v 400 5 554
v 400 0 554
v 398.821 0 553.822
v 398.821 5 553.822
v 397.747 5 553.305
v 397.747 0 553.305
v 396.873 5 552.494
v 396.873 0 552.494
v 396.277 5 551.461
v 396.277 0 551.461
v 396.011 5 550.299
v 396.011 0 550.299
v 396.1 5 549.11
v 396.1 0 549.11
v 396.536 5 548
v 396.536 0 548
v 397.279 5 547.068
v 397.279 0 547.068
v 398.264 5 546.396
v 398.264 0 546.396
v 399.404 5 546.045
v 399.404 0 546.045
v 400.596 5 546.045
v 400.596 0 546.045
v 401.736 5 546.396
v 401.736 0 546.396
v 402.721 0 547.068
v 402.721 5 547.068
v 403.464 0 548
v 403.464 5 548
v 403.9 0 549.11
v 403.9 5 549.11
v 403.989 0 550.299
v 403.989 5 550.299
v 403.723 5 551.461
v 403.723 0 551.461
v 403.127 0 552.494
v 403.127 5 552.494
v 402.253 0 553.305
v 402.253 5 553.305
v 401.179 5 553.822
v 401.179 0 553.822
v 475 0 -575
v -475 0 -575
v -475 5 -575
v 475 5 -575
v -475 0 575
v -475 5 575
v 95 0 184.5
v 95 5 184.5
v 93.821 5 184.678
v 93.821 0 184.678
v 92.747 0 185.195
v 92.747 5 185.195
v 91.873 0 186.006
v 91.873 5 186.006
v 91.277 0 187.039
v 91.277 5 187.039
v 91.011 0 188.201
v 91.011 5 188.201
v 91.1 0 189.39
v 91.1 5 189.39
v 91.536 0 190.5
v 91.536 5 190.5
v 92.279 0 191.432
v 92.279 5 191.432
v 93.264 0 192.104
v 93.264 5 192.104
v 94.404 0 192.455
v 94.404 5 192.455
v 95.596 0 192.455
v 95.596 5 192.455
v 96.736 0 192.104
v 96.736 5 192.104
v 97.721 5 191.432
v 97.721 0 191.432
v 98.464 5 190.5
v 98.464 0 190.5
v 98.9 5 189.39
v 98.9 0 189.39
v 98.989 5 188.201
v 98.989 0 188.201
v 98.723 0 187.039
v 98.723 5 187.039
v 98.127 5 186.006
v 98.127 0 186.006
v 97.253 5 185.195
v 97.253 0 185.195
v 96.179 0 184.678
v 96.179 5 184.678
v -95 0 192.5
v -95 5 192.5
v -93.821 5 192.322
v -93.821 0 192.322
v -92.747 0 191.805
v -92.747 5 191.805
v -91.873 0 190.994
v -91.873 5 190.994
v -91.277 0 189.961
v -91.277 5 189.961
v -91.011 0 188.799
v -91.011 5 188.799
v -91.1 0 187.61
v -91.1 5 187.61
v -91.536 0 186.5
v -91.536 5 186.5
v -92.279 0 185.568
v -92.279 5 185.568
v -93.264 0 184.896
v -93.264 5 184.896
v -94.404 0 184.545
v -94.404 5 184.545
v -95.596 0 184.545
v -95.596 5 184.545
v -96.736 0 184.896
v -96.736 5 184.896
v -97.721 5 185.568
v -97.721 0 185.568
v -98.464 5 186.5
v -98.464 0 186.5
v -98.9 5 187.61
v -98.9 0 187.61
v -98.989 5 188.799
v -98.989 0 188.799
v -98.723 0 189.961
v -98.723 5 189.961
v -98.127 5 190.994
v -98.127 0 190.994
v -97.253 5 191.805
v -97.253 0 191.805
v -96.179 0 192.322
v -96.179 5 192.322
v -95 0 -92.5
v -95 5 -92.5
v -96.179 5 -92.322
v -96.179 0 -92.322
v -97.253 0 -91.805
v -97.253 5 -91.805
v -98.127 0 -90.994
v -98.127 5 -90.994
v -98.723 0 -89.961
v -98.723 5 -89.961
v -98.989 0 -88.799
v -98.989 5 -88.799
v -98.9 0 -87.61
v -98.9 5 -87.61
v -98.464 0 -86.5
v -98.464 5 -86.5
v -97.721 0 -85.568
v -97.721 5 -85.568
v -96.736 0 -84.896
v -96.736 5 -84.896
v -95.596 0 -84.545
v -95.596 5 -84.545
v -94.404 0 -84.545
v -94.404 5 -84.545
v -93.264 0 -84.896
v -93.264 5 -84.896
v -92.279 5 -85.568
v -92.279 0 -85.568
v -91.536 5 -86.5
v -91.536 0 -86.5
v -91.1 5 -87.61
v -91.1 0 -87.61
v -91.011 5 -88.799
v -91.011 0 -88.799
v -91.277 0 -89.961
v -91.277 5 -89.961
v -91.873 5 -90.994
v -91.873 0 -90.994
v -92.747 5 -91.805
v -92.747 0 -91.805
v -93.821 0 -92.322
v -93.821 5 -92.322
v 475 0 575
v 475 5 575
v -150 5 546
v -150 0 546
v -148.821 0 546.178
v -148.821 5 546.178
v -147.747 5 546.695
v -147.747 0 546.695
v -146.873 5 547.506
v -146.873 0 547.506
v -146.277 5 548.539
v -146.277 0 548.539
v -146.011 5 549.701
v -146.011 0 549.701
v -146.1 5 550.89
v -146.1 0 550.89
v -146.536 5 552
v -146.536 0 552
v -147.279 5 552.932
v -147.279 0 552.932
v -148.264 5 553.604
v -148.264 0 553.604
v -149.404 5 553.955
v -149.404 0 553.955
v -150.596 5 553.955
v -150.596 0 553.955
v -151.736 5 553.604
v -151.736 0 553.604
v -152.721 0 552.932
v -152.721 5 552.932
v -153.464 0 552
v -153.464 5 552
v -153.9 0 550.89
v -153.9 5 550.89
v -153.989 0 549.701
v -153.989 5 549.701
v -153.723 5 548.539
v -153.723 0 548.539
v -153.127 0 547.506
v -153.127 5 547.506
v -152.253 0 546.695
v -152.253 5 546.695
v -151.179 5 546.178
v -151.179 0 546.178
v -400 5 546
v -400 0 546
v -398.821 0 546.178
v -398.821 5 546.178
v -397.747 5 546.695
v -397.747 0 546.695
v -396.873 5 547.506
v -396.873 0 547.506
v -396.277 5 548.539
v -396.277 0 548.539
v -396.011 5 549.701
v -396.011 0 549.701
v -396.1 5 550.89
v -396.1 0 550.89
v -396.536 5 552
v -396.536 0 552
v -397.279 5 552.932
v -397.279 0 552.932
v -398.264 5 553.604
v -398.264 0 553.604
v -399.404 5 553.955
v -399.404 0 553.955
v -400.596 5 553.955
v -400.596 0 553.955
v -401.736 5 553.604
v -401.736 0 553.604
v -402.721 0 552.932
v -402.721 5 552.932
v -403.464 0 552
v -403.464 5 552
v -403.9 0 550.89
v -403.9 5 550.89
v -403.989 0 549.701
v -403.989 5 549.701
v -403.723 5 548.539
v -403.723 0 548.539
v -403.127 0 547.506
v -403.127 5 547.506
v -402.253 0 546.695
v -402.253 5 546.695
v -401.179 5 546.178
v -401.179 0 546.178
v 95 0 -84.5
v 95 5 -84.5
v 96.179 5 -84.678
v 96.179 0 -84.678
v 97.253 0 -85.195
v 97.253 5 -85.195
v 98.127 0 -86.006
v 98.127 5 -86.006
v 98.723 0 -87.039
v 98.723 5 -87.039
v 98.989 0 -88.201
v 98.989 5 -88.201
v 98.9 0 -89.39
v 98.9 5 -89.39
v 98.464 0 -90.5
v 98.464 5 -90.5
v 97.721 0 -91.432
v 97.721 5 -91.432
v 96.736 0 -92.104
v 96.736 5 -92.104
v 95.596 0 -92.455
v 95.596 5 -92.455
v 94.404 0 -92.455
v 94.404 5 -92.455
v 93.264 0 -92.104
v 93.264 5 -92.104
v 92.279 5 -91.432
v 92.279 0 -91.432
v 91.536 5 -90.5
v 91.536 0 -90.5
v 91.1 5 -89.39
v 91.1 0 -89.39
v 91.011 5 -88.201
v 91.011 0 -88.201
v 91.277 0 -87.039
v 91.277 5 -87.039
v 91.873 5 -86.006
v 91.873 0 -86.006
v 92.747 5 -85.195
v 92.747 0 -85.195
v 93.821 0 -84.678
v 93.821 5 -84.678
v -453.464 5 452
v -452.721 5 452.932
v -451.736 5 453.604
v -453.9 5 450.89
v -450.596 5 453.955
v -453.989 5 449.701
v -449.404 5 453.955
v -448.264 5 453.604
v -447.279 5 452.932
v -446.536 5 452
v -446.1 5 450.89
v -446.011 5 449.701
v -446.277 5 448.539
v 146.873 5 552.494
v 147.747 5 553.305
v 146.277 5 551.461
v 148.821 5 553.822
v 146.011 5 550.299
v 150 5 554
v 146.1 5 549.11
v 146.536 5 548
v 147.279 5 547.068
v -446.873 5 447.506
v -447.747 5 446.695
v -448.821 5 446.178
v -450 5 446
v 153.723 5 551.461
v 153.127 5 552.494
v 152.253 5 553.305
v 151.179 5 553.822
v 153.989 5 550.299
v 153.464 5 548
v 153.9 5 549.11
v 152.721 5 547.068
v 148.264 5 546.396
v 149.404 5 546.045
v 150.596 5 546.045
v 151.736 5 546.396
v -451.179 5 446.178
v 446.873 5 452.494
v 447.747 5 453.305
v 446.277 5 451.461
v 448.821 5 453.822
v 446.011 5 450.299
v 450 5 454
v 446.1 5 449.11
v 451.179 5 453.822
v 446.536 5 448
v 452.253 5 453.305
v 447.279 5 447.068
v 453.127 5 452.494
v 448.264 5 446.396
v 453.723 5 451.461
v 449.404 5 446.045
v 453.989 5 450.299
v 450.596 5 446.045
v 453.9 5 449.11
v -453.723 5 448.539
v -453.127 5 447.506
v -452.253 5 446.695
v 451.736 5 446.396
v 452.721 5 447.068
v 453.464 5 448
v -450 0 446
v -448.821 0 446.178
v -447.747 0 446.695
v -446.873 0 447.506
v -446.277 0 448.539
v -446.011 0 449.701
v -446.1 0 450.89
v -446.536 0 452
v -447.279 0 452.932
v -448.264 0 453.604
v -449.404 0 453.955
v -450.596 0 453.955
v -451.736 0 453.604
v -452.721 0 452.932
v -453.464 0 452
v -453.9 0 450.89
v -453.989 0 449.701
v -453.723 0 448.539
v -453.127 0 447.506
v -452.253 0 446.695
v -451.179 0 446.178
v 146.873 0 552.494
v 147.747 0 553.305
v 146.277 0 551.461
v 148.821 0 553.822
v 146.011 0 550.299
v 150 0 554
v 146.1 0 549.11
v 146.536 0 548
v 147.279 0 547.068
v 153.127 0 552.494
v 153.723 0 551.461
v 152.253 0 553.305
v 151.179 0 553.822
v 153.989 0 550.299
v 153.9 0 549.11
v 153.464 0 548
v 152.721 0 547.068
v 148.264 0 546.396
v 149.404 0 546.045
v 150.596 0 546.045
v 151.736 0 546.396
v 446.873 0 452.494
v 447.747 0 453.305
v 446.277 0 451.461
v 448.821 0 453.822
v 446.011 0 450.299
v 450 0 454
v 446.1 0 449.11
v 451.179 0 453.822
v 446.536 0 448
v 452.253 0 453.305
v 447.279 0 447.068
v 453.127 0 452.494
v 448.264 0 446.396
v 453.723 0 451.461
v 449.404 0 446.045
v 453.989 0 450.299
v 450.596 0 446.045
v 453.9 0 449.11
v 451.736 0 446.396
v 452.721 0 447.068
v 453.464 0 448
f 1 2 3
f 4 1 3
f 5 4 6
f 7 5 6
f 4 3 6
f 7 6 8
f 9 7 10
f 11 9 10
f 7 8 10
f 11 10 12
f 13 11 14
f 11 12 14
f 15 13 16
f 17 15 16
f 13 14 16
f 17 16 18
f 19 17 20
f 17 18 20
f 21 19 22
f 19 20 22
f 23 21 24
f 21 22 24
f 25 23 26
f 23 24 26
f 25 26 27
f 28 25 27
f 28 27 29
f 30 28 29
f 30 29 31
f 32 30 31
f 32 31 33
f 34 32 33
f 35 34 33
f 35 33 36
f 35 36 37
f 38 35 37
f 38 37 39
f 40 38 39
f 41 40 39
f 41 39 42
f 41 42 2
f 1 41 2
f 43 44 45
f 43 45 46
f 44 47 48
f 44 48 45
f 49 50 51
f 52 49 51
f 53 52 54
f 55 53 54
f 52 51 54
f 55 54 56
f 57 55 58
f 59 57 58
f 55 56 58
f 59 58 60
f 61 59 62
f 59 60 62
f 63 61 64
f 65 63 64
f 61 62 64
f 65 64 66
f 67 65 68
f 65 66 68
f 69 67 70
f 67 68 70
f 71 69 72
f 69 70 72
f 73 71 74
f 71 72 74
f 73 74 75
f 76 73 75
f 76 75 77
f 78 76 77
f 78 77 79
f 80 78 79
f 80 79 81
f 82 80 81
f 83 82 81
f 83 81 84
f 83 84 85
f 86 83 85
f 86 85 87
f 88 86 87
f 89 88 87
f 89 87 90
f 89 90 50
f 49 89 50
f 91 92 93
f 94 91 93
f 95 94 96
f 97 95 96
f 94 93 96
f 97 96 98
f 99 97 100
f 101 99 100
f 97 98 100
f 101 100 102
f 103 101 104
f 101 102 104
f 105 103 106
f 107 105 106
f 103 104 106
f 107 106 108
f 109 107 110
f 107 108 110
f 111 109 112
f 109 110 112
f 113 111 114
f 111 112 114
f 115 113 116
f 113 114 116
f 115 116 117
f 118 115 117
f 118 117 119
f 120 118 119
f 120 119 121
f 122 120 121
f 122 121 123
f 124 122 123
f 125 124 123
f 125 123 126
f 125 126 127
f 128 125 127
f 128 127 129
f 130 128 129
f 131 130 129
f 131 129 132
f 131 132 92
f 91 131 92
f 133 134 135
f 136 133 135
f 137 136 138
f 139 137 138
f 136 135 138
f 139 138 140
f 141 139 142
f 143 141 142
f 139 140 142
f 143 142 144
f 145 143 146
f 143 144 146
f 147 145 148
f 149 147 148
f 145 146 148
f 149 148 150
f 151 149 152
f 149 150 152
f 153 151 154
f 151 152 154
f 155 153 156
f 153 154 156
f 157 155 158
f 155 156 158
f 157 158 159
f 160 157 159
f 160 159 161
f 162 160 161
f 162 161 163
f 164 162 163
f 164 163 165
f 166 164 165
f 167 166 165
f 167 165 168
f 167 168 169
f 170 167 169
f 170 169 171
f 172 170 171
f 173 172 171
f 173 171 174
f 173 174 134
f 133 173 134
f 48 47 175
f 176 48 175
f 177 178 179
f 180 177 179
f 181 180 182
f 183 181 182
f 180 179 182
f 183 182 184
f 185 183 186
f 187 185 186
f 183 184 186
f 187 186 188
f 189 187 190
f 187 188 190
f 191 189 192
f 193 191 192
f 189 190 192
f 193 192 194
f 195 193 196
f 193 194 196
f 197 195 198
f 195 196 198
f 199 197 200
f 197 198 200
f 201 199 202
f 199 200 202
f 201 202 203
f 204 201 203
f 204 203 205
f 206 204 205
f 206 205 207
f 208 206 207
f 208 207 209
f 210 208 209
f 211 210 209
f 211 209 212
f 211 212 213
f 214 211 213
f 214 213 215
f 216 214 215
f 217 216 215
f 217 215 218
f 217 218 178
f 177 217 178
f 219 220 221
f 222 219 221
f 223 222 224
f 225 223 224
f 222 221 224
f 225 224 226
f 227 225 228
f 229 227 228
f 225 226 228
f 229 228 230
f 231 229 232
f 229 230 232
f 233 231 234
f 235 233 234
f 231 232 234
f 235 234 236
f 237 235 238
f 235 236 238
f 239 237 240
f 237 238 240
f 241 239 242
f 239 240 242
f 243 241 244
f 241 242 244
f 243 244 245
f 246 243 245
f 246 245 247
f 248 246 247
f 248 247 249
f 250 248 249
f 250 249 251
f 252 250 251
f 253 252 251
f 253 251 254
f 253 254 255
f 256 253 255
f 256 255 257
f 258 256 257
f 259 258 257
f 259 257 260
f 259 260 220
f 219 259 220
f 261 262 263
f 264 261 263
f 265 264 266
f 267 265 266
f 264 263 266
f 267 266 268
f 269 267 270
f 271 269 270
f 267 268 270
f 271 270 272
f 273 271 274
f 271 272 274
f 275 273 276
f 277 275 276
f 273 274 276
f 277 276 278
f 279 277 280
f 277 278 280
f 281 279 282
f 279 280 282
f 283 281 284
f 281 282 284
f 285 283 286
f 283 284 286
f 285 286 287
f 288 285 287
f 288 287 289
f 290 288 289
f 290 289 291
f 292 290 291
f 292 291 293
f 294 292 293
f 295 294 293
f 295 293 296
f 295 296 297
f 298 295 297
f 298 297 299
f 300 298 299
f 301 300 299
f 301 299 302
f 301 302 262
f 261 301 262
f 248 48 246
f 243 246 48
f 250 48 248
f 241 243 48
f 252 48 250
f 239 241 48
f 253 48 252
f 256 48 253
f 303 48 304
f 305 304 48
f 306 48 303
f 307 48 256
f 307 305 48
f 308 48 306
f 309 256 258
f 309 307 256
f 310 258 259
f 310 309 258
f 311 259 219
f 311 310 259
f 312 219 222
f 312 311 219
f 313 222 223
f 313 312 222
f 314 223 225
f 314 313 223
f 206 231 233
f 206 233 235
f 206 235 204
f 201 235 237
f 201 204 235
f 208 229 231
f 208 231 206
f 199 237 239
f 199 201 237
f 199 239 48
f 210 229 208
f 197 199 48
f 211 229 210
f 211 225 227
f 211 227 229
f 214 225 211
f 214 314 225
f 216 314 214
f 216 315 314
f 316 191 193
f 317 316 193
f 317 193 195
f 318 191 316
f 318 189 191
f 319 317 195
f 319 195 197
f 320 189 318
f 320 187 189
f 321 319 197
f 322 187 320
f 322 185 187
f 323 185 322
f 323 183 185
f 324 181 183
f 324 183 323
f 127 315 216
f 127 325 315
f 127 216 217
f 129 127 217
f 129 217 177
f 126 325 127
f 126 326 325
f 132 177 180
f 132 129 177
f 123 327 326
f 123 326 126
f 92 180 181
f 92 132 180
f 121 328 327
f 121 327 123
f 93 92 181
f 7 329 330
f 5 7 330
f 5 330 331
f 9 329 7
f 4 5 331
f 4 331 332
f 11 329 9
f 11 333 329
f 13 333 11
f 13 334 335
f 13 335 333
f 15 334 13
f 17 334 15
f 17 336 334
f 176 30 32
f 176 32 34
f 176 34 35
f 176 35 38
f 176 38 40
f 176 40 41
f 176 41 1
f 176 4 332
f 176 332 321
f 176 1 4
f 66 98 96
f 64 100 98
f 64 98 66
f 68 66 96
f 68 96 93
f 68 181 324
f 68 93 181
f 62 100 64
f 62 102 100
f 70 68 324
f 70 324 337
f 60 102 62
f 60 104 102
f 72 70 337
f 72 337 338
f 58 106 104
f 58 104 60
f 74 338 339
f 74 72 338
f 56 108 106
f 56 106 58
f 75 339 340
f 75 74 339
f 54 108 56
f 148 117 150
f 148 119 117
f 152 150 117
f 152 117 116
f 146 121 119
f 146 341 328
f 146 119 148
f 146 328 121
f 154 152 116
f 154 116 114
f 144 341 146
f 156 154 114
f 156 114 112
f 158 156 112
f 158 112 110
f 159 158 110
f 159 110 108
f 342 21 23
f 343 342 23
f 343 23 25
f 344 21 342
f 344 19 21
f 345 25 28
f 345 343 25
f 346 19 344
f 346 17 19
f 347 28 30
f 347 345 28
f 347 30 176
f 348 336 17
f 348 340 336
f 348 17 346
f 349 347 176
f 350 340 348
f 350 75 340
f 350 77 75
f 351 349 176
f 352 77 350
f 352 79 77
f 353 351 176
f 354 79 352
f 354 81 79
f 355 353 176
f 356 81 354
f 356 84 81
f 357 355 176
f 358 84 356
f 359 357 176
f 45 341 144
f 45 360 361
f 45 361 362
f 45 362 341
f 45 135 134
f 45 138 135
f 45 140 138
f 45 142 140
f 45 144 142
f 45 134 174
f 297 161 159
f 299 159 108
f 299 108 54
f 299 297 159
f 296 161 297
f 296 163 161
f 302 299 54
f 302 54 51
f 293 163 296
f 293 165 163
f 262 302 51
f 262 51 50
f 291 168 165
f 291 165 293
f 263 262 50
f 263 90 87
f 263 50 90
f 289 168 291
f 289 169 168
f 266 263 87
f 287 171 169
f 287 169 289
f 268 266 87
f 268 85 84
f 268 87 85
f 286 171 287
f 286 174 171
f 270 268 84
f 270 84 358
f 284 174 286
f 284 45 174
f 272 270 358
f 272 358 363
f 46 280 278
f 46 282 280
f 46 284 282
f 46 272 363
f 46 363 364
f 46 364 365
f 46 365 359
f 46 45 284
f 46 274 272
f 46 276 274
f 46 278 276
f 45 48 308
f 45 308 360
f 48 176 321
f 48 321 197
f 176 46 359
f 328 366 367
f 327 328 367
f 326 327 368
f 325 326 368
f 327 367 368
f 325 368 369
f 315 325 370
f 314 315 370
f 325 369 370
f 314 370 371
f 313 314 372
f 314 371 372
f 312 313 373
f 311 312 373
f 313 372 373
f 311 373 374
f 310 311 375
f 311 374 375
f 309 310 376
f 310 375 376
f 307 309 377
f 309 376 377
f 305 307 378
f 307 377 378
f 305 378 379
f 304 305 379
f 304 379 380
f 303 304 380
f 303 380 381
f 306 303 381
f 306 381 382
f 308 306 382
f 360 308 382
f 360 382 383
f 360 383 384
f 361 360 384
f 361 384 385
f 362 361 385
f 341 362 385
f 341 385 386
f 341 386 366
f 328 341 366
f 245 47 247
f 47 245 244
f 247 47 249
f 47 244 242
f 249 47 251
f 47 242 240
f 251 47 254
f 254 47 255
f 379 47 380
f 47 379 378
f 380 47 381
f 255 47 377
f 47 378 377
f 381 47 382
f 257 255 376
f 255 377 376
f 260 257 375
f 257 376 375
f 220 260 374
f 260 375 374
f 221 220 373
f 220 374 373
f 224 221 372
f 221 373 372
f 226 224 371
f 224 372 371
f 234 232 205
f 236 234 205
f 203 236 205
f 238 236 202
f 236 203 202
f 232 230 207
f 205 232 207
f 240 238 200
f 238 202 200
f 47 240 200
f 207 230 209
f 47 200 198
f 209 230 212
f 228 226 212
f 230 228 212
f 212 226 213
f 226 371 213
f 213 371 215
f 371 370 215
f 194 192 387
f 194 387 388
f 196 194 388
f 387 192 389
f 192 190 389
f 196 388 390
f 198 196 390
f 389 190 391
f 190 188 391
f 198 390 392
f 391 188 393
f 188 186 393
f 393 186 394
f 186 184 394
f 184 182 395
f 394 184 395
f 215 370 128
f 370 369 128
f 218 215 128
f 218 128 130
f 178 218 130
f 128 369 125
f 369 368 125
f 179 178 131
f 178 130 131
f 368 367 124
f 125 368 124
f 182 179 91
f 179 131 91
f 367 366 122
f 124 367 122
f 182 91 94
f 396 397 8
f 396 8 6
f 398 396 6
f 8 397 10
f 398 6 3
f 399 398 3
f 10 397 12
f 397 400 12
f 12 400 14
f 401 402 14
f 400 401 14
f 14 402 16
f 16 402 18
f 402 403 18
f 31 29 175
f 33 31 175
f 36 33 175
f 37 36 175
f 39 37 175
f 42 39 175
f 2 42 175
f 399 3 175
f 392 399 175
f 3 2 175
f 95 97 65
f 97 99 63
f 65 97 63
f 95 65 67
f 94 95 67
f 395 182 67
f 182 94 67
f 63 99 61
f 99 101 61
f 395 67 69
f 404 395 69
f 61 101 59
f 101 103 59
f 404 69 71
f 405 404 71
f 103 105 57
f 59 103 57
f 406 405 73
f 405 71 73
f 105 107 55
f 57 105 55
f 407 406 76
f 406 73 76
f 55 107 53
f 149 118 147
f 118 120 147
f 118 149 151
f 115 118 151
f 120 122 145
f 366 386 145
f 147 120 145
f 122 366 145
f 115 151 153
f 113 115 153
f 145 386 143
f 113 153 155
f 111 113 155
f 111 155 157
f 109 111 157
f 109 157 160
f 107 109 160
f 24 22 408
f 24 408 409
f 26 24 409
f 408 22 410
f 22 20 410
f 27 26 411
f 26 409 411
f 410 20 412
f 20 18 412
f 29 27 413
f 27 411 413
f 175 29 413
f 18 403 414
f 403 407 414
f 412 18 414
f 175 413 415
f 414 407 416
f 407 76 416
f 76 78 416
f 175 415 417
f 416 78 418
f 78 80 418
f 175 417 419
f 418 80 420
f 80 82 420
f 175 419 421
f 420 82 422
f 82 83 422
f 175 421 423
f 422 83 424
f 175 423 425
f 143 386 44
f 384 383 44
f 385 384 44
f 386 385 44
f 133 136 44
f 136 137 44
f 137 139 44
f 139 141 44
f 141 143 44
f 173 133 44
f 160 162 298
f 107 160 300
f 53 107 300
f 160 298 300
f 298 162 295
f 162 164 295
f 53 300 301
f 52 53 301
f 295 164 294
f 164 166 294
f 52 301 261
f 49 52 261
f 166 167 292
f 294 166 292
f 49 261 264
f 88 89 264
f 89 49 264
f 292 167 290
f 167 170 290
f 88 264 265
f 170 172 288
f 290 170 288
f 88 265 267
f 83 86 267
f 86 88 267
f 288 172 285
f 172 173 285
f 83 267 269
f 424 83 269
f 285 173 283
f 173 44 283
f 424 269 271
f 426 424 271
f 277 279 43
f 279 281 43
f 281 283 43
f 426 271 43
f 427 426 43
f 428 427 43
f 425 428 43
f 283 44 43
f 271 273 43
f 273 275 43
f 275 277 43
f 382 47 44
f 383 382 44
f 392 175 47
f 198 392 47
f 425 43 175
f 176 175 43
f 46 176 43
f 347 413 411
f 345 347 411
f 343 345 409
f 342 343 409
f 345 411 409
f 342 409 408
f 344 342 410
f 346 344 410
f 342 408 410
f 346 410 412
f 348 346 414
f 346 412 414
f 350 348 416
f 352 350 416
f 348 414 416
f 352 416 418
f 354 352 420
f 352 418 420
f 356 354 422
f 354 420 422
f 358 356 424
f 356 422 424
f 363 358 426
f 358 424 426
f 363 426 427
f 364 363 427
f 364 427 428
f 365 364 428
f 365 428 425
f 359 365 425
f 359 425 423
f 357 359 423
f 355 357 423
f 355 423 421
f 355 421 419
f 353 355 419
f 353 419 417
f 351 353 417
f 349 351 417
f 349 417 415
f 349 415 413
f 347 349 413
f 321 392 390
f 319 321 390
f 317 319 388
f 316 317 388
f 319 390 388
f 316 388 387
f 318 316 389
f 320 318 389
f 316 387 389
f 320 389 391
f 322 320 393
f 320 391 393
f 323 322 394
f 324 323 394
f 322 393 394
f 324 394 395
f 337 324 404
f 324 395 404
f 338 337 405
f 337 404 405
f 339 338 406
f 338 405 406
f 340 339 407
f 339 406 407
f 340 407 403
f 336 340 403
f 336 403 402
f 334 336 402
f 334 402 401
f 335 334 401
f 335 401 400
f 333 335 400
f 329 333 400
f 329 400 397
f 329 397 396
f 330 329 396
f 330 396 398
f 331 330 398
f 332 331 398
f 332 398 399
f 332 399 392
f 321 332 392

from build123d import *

# Parameters (mm, degrees)
SKETCH1_W           = 950
SKETCH1_H           = 1150
BOSS_EXTRUDE1_DEPTH = 5
SKETCH2_R           = 4
CUT_EXTRUDE1_DEPTH  = 746.838454359
SKETCH3_R           = 4
CUT_EXTRUDE2_DEPTH  = 10


with BuildPart() as part:
    # Sketch1 → Boss-Extrude1 (new body)
    with BuildSketch(Plane(origin=(0, 0, 0), x_dir=(1, 0, 0), z_dir=(0, 1, 0))):
        Rectangle(SKETCH1_W, SKETCH1_H)
    extrude(amount=BOSS_EXTRUDE1_DEPTH)

    # Sketch2 → Cut-Extrude1 (cut, through all)
    with BuildSketch(Plane(origin=(0, 5, 0), x_dir=(1, 0, 0), z_dir=(0, 1, 0))):
        with Locations(Location((95, 88.5, 0), (0, 0, 270))):
            Circle(SKETCH2_R)
        with Locations(Location((-95, 88.5, 0), (0, 0, 90))):
            Circle(SKETCH2_R)
        with Locations(Location((95, -188.5, 0), (0, 0, 90))):
            Circle(SKETCH2_R)
        with Locations(Location((-95, -188.5, 0), (0, 0, 270))):
            Circle(SKETCH2_R)
    extrude(amount=-CUT_EXTRUDE1_DEPTH, mode=Mode.SUBTRACT)

    # Sketch3 → Cut-Extrude2 (cut)
    with BuildSketch(Plane.XZ):
        with Locations(Location((-400, 550, 0), (0, 0, 270))):
            Circle(SKETCH3_R)
        with Locations(Location((-450, 450, 0), (0, 0, 270))):
            Circle(SKETCH3_R)
        with Locations(Location((-150, 550, 0), (0, 0, 270))):
            Circle(SKETCH3_R)
        with Locations(Location((450, 450, 0), (0, 0, 90))):
            Circle(SKETCH3_R)
        with Locations(Location((150, 550, 0), (0, 0, 90))):
            Circle(SKETCH3_R)
        with Locations(Location((400, 550, 0), (0, 0, 90))):
            Circle(SKETCH3_R)
    extrude(amount=-CUT_EXTRUDE2_DEPTH, mode=Mode.SUBTRACT)


solid = part.part
